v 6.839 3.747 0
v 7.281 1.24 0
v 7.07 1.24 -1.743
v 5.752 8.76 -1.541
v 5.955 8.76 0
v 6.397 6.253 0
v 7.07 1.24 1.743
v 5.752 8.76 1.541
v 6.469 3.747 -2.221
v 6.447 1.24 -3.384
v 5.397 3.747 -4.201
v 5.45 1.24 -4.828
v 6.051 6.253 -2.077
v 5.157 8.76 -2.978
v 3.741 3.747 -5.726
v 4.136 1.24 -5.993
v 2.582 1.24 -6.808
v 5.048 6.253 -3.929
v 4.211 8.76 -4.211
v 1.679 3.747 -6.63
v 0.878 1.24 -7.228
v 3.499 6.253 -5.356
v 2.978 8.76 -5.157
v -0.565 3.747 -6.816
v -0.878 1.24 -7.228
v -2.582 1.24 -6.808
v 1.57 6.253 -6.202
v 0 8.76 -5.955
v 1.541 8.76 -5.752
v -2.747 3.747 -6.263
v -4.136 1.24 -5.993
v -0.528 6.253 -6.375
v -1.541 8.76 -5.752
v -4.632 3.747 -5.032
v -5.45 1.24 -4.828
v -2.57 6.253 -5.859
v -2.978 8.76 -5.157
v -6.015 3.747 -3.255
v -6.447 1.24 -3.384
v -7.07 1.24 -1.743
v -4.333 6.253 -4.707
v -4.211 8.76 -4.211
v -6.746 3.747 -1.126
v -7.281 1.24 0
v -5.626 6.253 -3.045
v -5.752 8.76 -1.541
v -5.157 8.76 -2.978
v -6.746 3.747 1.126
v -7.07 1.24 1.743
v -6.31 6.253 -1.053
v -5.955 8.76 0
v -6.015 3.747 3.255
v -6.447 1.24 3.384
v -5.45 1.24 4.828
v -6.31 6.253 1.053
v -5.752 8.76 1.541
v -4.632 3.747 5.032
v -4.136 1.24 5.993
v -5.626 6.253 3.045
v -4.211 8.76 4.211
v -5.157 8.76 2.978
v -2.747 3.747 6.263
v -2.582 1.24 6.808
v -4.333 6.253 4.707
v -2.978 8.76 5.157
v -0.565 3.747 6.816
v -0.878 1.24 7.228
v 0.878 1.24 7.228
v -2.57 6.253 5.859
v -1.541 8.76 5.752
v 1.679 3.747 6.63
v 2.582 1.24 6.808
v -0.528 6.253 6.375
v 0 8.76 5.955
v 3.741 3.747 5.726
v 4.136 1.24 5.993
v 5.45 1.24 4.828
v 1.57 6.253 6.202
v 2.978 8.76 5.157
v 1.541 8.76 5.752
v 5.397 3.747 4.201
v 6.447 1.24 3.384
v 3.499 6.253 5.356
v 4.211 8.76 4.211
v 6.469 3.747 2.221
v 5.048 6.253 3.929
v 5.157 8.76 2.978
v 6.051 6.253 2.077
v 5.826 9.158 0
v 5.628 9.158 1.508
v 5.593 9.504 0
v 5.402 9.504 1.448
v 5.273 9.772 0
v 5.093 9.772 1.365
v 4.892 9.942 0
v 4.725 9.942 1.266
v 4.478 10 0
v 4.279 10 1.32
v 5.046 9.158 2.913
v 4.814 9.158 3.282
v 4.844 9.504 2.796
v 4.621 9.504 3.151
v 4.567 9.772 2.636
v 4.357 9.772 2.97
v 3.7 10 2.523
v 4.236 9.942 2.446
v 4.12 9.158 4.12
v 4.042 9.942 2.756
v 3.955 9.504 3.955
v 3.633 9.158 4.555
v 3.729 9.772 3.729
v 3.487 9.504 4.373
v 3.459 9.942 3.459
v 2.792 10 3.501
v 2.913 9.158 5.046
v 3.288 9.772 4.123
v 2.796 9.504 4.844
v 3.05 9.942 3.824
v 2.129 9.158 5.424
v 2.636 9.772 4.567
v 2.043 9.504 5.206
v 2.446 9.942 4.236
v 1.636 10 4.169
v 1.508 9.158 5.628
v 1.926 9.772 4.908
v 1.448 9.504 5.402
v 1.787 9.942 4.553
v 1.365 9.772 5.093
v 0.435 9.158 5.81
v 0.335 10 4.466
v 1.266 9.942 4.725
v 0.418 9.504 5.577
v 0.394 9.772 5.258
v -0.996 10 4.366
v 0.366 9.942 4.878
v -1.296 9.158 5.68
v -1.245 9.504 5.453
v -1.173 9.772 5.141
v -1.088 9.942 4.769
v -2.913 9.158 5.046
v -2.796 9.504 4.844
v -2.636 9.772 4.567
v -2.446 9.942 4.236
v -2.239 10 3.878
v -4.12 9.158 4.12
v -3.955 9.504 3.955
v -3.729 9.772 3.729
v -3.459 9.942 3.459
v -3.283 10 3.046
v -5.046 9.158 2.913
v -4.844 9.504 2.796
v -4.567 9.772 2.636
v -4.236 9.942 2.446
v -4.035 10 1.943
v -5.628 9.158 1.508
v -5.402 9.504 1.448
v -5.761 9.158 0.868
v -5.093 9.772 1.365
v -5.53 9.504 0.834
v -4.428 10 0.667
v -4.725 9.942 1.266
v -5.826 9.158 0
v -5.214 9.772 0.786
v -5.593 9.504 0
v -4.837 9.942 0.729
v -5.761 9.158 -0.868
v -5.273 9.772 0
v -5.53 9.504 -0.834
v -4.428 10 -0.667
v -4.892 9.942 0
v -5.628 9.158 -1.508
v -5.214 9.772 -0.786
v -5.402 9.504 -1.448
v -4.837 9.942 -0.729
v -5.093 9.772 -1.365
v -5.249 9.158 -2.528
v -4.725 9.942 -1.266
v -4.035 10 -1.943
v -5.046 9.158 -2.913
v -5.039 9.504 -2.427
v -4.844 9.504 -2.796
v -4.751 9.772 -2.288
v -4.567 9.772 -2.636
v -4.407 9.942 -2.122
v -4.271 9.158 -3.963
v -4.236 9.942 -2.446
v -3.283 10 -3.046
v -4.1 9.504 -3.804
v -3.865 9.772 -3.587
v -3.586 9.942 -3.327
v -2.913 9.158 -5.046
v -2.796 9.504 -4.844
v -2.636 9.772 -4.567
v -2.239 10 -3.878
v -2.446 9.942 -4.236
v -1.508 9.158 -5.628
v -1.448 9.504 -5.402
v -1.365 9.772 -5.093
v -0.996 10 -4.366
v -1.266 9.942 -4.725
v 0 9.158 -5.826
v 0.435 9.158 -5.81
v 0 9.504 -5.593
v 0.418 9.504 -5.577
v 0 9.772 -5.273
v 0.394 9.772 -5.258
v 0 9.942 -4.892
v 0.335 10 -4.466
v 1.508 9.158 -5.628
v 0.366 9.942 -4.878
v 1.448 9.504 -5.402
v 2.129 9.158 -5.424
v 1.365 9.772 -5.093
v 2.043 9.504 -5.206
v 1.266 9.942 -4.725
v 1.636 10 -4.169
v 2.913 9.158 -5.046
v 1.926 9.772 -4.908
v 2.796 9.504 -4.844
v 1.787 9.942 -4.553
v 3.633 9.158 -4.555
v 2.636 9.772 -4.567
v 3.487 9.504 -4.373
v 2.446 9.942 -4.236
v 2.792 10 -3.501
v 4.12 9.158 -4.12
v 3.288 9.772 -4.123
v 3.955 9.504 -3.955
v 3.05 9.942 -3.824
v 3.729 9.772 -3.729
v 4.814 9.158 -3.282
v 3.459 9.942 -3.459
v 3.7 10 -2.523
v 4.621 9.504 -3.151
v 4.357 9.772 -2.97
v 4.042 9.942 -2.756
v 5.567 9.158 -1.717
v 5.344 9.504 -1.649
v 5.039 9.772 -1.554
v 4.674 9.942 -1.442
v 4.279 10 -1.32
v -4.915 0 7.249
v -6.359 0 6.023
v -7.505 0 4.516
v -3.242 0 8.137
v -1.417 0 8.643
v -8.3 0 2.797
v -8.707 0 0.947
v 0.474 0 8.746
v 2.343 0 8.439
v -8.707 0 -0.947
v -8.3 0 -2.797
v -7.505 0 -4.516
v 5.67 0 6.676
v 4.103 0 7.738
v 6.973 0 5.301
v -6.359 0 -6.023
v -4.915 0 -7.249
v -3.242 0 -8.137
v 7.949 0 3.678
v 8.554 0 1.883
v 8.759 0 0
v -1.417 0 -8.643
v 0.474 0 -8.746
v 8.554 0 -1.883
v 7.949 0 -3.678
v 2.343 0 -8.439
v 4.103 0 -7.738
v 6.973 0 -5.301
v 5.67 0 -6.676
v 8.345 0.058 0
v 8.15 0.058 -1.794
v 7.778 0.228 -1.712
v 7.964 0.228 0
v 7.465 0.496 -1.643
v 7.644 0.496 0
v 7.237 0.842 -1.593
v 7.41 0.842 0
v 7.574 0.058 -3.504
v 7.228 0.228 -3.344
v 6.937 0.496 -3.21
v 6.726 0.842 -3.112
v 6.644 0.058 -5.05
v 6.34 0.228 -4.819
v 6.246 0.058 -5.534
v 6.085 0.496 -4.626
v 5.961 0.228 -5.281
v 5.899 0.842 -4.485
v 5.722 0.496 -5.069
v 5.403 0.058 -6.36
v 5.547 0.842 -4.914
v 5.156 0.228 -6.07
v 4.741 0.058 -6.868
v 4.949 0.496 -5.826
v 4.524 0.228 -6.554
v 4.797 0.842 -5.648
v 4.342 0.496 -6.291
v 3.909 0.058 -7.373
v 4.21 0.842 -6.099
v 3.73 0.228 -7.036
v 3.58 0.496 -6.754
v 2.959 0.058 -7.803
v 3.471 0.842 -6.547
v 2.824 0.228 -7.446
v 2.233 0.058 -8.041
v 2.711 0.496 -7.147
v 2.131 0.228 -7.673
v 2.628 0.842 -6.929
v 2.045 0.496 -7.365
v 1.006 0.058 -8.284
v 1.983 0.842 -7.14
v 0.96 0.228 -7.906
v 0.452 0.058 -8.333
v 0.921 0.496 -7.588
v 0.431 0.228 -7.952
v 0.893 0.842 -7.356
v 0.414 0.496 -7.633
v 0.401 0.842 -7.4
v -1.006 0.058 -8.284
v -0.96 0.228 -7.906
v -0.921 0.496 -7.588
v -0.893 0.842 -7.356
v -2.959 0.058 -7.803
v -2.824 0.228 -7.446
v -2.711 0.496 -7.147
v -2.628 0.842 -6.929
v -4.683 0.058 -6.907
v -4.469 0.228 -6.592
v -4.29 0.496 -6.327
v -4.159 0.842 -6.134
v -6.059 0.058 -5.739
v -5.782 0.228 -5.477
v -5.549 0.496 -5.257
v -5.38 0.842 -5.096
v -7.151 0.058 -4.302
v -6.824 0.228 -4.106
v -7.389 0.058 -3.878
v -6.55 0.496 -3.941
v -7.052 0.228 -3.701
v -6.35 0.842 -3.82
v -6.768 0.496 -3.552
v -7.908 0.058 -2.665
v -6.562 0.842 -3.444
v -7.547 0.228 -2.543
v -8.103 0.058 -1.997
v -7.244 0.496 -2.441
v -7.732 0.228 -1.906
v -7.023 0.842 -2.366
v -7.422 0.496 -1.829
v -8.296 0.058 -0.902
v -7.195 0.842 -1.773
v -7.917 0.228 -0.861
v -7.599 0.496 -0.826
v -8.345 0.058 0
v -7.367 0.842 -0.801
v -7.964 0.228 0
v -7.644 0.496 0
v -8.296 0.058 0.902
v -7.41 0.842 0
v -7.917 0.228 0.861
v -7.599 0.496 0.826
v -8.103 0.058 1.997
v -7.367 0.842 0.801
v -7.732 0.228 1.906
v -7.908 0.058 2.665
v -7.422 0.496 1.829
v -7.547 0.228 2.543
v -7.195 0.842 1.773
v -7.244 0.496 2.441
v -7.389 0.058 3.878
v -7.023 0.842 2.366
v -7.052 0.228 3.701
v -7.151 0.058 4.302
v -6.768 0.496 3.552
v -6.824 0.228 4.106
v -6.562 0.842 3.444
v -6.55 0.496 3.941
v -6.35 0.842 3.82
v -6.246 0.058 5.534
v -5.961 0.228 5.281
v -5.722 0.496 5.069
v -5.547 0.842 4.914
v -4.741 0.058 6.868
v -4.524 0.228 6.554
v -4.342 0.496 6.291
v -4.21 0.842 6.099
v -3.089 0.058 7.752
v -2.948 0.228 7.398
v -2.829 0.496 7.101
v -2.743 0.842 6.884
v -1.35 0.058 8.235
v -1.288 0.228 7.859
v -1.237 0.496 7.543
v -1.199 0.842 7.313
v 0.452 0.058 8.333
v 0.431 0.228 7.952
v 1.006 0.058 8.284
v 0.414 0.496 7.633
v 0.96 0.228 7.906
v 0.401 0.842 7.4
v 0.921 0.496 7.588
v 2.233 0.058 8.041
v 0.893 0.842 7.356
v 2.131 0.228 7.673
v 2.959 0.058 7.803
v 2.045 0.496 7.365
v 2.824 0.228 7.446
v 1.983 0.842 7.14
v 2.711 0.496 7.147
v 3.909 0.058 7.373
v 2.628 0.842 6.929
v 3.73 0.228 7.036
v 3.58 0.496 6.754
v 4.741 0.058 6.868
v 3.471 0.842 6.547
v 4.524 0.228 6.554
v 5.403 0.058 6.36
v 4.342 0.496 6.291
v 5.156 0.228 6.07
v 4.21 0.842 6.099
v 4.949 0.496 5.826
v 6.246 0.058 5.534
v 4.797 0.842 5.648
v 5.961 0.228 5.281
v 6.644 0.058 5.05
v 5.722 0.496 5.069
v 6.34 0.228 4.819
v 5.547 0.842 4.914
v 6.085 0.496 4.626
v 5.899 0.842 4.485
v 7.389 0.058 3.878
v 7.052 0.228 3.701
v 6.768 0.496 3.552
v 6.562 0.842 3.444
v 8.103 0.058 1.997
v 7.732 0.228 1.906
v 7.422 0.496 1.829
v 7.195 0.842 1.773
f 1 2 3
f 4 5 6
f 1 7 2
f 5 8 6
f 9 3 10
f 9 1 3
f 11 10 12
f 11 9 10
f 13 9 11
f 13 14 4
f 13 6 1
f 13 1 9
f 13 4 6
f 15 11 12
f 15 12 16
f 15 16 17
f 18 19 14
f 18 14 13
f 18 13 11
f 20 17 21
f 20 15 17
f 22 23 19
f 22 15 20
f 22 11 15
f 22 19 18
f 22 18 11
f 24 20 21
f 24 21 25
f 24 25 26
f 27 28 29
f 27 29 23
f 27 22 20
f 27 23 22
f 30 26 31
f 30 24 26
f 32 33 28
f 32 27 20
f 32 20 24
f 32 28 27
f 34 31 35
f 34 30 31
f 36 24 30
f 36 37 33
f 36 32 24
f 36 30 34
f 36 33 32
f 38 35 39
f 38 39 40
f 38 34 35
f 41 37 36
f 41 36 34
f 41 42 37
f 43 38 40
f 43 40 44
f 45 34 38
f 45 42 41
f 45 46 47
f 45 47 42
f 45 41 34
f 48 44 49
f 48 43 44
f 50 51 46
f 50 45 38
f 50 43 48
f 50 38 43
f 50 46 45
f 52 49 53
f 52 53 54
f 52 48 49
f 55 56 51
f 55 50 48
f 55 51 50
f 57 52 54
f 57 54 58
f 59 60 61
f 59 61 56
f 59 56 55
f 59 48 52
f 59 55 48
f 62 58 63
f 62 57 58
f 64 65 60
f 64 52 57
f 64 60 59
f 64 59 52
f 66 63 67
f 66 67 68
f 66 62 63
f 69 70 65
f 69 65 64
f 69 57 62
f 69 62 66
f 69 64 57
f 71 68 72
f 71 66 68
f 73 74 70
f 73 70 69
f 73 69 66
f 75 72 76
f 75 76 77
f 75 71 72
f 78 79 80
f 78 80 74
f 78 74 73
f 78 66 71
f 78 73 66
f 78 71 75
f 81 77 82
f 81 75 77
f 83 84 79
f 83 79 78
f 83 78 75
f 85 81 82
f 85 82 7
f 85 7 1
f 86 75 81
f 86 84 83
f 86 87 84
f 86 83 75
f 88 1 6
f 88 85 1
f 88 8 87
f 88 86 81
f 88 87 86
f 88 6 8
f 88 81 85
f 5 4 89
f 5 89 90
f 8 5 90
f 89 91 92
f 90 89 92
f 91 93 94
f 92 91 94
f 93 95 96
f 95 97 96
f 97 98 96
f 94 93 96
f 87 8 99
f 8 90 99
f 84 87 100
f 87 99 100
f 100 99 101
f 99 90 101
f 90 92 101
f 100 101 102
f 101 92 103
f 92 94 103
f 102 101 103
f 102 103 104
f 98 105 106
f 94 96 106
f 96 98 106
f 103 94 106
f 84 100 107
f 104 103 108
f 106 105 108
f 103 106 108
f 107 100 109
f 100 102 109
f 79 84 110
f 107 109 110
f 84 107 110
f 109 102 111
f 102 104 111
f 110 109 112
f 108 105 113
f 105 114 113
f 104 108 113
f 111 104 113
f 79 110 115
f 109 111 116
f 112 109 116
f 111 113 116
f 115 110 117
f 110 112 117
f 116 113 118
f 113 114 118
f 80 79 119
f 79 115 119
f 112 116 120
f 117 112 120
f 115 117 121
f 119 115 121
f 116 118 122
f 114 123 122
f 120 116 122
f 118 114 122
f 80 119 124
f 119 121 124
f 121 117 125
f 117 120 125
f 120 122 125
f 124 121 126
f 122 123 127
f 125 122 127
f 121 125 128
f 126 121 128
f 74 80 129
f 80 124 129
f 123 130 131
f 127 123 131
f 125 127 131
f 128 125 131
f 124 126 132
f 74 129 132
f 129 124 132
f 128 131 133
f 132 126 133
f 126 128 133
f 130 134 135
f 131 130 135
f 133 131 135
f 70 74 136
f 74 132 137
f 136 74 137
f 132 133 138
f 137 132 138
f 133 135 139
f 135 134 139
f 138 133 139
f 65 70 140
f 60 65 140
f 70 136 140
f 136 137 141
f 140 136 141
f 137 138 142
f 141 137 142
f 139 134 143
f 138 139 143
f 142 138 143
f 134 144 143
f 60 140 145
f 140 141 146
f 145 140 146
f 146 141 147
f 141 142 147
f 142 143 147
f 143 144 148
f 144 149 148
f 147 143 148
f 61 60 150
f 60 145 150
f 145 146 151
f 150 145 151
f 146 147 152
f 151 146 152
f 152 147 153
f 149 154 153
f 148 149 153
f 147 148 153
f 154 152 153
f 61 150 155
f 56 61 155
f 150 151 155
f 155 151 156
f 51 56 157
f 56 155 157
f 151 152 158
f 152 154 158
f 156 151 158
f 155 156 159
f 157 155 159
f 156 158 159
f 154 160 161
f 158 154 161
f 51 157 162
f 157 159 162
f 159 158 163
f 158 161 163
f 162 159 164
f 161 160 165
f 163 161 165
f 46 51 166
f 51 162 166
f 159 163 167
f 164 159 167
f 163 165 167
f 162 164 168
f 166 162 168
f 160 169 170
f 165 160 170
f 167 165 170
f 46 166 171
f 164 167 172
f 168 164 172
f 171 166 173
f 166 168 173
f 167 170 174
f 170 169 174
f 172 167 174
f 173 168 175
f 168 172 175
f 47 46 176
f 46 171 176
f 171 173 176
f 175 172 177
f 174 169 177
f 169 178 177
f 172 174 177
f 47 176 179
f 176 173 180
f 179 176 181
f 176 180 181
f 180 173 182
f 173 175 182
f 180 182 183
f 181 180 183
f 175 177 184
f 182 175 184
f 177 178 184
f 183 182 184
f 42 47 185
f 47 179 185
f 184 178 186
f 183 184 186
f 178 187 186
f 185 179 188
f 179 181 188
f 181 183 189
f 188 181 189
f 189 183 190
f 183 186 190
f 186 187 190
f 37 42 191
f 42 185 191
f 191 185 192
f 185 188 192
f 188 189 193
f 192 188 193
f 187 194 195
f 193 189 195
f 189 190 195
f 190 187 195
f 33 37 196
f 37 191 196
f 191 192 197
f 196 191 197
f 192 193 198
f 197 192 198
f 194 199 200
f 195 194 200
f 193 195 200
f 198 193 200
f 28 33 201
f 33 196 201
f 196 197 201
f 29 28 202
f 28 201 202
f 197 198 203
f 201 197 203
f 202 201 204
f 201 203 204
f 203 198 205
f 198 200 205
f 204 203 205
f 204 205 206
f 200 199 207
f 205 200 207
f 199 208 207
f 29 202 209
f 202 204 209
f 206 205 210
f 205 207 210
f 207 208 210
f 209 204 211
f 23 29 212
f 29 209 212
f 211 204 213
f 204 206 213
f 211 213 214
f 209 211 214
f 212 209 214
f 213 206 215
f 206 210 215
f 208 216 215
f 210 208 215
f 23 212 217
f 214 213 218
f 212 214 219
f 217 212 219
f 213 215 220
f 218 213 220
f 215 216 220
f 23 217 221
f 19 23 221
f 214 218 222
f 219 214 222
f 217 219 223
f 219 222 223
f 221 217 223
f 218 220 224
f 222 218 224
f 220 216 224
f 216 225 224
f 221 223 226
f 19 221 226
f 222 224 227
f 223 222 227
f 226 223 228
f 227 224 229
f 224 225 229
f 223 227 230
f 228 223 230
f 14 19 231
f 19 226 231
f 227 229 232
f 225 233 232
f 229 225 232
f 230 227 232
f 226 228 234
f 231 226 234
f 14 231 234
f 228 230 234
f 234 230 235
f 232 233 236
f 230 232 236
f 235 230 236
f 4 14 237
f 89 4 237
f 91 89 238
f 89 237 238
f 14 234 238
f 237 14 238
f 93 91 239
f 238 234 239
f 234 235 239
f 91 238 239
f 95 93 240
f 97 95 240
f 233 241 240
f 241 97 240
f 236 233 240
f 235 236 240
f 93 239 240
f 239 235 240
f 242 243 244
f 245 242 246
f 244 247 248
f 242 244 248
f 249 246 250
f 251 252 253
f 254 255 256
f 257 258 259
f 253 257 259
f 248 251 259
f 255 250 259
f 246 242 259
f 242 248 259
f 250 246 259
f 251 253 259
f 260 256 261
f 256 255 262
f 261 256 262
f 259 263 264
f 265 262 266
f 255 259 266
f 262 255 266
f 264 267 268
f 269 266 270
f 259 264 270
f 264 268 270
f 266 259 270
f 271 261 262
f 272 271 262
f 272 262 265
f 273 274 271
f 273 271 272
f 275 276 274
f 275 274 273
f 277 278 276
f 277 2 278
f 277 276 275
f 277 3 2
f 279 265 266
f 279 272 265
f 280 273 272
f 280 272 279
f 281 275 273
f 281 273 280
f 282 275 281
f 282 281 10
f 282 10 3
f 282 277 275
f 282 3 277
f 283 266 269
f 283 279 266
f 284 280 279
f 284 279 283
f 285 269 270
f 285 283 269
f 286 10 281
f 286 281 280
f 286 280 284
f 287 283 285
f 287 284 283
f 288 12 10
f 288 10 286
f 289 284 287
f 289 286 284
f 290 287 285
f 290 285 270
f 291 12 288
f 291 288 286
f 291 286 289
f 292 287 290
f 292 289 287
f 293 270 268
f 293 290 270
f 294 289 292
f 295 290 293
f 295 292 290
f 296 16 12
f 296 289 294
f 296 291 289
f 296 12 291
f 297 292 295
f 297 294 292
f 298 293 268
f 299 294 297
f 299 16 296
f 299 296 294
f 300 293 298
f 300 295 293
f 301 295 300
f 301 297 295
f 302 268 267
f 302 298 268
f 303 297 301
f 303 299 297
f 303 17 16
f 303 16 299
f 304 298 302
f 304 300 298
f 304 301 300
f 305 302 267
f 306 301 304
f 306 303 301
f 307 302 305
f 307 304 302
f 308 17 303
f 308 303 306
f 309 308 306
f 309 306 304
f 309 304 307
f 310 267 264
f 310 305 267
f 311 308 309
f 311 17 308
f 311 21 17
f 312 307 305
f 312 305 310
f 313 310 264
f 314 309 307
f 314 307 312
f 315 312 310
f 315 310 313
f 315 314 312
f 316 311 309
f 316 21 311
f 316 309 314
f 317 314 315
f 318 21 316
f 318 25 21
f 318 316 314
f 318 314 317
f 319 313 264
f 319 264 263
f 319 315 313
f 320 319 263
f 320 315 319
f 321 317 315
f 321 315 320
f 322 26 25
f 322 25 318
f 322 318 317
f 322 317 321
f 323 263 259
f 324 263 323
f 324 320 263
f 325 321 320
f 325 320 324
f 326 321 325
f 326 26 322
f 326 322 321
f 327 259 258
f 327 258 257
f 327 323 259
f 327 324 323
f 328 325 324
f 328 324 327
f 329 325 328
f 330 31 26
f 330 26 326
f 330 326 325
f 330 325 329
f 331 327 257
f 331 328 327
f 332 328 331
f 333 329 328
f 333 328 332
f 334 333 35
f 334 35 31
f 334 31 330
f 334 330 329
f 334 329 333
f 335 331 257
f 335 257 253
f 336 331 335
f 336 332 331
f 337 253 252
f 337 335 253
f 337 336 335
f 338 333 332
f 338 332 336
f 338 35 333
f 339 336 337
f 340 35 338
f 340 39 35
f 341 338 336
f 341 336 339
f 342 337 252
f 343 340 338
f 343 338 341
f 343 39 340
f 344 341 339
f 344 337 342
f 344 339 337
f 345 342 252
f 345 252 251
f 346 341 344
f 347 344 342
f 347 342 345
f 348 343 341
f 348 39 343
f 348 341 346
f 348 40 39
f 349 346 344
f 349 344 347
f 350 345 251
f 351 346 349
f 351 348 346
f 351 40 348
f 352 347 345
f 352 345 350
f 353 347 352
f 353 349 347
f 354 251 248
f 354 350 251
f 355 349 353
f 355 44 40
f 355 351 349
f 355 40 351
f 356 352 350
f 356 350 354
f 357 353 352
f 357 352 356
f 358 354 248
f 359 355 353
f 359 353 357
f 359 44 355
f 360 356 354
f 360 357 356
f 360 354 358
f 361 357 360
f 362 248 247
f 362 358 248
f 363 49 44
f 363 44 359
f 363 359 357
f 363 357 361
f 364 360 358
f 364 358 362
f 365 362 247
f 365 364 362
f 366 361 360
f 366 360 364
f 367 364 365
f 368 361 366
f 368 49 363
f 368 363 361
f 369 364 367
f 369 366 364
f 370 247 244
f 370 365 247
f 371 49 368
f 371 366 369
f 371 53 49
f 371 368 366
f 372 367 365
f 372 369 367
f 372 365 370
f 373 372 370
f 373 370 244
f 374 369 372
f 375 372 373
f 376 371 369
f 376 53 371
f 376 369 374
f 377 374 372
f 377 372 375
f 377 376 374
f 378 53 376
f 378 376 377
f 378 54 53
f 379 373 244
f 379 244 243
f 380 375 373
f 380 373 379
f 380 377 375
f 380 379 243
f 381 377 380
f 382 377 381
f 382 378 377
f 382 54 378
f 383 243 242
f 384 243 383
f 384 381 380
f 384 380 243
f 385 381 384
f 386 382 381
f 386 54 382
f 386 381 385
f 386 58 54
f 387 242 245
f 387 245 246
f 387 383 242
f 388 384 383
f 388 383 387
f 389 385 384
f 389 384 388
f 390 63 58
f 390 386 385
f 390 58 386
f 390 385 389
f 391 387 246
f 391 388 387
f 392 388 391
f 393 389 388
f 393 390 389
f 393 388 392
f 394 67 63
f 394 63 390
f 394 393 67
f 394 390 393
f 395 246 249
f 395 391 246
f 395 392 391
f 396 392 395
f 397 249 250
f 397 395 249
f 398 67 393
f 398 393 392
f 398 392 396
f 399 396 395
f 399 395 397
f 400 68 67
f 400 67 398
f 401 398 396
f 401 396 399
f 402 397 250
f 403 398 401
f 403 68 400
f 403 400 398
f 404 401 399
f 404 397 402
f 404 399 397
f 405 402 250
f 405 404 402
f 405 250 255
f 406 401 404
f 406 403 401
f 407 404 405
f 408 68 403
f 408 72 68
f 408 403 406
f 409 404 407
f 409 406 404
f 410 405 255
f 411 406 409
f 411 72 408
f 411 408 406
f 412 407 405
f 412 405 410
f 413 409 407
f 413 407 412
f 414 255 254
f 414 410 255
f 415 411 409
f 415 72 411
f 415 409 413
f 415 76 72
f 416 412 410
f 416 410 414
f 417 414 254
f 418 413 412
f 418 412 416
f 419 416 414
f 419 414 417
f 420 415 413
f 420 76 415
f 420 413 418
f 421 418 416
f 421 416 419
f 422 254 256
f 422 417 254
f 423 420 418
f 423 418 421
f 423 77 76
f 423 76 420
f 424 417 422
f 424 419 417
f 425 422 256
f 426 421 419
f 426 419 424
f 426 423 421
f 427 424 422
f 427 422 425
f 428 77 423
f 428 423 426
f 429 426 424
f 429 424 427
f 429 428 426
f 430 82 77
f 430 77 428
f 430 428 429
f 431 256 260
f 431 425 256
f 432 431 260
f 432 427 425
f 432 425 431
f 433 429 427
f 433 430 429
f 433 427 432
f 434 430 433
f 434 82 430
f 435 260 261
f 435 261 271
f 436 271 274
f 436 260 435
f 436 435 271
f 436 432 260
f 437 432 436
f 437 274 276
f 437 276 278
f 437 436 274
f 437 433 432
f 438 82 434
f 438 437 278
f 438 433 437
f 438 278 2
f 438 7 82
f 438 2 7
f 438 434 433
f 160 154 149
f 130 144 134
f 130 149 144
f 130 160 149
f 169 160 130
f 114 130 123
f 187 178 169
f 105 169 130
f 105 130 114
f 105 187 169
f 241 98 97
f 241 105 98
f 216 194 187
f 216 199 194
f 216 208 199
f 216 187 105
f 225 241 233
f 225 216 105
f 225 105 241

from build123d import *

# Parameters (mm, degrees)
SKETCH1_W           = 30
SKETCH1_H           = 30
BOSS_EXTRUDE1_DEPTH = 1
SKETCH2_R           = 7.5
BOSS_EXTRUDE2_DEPTH = 10
BOSS_EXTRUDE2_TAPER = 10
FILLET2_R           = 1.5


with BuildPart() as part:
    # Sketch1 → Boss-Extrude1 (new body)
    with BuildSketch(Plane(origin=(0, 0, 0), x_dir=(1, 0, 0), z_dir=(0, 1, 0))):
        Rectangle(SKETCH1_W, SKETCH1_H)
    extrude(amount=-BOSS_EXTRUDE1_DEPTH)

    # Sketch2 → Boss-Extrude2 (add)
    with BuildSketch(Plane(origin=(0, 0, 0), x_dir=(1, 0, 0), z_dir=(0, 1, 0))):
        Circle(SKETCH2_R)
    extrude(amount=BOSS_EXTRUDE2_DEPTH, taper=BOSS_EXTRUDE2_TAPER)

    # Fillet2
    fillet2_edges = [part.edges().sort_by_distance(p)[0] for p in [
        (-7.5, 0, 0),
        (-5.736730193, 10, 0),
    ]]
    fillet(fillet2_edges, radius=FILLET2_R)

    # SurfaceCut2
    split(bisect_by=Plane(origin=(0, 0, 0), x_dir=(1, 0, 0), z_dir=(0, 1, 0)), keep=Keep.TOP)


solid = part.part
